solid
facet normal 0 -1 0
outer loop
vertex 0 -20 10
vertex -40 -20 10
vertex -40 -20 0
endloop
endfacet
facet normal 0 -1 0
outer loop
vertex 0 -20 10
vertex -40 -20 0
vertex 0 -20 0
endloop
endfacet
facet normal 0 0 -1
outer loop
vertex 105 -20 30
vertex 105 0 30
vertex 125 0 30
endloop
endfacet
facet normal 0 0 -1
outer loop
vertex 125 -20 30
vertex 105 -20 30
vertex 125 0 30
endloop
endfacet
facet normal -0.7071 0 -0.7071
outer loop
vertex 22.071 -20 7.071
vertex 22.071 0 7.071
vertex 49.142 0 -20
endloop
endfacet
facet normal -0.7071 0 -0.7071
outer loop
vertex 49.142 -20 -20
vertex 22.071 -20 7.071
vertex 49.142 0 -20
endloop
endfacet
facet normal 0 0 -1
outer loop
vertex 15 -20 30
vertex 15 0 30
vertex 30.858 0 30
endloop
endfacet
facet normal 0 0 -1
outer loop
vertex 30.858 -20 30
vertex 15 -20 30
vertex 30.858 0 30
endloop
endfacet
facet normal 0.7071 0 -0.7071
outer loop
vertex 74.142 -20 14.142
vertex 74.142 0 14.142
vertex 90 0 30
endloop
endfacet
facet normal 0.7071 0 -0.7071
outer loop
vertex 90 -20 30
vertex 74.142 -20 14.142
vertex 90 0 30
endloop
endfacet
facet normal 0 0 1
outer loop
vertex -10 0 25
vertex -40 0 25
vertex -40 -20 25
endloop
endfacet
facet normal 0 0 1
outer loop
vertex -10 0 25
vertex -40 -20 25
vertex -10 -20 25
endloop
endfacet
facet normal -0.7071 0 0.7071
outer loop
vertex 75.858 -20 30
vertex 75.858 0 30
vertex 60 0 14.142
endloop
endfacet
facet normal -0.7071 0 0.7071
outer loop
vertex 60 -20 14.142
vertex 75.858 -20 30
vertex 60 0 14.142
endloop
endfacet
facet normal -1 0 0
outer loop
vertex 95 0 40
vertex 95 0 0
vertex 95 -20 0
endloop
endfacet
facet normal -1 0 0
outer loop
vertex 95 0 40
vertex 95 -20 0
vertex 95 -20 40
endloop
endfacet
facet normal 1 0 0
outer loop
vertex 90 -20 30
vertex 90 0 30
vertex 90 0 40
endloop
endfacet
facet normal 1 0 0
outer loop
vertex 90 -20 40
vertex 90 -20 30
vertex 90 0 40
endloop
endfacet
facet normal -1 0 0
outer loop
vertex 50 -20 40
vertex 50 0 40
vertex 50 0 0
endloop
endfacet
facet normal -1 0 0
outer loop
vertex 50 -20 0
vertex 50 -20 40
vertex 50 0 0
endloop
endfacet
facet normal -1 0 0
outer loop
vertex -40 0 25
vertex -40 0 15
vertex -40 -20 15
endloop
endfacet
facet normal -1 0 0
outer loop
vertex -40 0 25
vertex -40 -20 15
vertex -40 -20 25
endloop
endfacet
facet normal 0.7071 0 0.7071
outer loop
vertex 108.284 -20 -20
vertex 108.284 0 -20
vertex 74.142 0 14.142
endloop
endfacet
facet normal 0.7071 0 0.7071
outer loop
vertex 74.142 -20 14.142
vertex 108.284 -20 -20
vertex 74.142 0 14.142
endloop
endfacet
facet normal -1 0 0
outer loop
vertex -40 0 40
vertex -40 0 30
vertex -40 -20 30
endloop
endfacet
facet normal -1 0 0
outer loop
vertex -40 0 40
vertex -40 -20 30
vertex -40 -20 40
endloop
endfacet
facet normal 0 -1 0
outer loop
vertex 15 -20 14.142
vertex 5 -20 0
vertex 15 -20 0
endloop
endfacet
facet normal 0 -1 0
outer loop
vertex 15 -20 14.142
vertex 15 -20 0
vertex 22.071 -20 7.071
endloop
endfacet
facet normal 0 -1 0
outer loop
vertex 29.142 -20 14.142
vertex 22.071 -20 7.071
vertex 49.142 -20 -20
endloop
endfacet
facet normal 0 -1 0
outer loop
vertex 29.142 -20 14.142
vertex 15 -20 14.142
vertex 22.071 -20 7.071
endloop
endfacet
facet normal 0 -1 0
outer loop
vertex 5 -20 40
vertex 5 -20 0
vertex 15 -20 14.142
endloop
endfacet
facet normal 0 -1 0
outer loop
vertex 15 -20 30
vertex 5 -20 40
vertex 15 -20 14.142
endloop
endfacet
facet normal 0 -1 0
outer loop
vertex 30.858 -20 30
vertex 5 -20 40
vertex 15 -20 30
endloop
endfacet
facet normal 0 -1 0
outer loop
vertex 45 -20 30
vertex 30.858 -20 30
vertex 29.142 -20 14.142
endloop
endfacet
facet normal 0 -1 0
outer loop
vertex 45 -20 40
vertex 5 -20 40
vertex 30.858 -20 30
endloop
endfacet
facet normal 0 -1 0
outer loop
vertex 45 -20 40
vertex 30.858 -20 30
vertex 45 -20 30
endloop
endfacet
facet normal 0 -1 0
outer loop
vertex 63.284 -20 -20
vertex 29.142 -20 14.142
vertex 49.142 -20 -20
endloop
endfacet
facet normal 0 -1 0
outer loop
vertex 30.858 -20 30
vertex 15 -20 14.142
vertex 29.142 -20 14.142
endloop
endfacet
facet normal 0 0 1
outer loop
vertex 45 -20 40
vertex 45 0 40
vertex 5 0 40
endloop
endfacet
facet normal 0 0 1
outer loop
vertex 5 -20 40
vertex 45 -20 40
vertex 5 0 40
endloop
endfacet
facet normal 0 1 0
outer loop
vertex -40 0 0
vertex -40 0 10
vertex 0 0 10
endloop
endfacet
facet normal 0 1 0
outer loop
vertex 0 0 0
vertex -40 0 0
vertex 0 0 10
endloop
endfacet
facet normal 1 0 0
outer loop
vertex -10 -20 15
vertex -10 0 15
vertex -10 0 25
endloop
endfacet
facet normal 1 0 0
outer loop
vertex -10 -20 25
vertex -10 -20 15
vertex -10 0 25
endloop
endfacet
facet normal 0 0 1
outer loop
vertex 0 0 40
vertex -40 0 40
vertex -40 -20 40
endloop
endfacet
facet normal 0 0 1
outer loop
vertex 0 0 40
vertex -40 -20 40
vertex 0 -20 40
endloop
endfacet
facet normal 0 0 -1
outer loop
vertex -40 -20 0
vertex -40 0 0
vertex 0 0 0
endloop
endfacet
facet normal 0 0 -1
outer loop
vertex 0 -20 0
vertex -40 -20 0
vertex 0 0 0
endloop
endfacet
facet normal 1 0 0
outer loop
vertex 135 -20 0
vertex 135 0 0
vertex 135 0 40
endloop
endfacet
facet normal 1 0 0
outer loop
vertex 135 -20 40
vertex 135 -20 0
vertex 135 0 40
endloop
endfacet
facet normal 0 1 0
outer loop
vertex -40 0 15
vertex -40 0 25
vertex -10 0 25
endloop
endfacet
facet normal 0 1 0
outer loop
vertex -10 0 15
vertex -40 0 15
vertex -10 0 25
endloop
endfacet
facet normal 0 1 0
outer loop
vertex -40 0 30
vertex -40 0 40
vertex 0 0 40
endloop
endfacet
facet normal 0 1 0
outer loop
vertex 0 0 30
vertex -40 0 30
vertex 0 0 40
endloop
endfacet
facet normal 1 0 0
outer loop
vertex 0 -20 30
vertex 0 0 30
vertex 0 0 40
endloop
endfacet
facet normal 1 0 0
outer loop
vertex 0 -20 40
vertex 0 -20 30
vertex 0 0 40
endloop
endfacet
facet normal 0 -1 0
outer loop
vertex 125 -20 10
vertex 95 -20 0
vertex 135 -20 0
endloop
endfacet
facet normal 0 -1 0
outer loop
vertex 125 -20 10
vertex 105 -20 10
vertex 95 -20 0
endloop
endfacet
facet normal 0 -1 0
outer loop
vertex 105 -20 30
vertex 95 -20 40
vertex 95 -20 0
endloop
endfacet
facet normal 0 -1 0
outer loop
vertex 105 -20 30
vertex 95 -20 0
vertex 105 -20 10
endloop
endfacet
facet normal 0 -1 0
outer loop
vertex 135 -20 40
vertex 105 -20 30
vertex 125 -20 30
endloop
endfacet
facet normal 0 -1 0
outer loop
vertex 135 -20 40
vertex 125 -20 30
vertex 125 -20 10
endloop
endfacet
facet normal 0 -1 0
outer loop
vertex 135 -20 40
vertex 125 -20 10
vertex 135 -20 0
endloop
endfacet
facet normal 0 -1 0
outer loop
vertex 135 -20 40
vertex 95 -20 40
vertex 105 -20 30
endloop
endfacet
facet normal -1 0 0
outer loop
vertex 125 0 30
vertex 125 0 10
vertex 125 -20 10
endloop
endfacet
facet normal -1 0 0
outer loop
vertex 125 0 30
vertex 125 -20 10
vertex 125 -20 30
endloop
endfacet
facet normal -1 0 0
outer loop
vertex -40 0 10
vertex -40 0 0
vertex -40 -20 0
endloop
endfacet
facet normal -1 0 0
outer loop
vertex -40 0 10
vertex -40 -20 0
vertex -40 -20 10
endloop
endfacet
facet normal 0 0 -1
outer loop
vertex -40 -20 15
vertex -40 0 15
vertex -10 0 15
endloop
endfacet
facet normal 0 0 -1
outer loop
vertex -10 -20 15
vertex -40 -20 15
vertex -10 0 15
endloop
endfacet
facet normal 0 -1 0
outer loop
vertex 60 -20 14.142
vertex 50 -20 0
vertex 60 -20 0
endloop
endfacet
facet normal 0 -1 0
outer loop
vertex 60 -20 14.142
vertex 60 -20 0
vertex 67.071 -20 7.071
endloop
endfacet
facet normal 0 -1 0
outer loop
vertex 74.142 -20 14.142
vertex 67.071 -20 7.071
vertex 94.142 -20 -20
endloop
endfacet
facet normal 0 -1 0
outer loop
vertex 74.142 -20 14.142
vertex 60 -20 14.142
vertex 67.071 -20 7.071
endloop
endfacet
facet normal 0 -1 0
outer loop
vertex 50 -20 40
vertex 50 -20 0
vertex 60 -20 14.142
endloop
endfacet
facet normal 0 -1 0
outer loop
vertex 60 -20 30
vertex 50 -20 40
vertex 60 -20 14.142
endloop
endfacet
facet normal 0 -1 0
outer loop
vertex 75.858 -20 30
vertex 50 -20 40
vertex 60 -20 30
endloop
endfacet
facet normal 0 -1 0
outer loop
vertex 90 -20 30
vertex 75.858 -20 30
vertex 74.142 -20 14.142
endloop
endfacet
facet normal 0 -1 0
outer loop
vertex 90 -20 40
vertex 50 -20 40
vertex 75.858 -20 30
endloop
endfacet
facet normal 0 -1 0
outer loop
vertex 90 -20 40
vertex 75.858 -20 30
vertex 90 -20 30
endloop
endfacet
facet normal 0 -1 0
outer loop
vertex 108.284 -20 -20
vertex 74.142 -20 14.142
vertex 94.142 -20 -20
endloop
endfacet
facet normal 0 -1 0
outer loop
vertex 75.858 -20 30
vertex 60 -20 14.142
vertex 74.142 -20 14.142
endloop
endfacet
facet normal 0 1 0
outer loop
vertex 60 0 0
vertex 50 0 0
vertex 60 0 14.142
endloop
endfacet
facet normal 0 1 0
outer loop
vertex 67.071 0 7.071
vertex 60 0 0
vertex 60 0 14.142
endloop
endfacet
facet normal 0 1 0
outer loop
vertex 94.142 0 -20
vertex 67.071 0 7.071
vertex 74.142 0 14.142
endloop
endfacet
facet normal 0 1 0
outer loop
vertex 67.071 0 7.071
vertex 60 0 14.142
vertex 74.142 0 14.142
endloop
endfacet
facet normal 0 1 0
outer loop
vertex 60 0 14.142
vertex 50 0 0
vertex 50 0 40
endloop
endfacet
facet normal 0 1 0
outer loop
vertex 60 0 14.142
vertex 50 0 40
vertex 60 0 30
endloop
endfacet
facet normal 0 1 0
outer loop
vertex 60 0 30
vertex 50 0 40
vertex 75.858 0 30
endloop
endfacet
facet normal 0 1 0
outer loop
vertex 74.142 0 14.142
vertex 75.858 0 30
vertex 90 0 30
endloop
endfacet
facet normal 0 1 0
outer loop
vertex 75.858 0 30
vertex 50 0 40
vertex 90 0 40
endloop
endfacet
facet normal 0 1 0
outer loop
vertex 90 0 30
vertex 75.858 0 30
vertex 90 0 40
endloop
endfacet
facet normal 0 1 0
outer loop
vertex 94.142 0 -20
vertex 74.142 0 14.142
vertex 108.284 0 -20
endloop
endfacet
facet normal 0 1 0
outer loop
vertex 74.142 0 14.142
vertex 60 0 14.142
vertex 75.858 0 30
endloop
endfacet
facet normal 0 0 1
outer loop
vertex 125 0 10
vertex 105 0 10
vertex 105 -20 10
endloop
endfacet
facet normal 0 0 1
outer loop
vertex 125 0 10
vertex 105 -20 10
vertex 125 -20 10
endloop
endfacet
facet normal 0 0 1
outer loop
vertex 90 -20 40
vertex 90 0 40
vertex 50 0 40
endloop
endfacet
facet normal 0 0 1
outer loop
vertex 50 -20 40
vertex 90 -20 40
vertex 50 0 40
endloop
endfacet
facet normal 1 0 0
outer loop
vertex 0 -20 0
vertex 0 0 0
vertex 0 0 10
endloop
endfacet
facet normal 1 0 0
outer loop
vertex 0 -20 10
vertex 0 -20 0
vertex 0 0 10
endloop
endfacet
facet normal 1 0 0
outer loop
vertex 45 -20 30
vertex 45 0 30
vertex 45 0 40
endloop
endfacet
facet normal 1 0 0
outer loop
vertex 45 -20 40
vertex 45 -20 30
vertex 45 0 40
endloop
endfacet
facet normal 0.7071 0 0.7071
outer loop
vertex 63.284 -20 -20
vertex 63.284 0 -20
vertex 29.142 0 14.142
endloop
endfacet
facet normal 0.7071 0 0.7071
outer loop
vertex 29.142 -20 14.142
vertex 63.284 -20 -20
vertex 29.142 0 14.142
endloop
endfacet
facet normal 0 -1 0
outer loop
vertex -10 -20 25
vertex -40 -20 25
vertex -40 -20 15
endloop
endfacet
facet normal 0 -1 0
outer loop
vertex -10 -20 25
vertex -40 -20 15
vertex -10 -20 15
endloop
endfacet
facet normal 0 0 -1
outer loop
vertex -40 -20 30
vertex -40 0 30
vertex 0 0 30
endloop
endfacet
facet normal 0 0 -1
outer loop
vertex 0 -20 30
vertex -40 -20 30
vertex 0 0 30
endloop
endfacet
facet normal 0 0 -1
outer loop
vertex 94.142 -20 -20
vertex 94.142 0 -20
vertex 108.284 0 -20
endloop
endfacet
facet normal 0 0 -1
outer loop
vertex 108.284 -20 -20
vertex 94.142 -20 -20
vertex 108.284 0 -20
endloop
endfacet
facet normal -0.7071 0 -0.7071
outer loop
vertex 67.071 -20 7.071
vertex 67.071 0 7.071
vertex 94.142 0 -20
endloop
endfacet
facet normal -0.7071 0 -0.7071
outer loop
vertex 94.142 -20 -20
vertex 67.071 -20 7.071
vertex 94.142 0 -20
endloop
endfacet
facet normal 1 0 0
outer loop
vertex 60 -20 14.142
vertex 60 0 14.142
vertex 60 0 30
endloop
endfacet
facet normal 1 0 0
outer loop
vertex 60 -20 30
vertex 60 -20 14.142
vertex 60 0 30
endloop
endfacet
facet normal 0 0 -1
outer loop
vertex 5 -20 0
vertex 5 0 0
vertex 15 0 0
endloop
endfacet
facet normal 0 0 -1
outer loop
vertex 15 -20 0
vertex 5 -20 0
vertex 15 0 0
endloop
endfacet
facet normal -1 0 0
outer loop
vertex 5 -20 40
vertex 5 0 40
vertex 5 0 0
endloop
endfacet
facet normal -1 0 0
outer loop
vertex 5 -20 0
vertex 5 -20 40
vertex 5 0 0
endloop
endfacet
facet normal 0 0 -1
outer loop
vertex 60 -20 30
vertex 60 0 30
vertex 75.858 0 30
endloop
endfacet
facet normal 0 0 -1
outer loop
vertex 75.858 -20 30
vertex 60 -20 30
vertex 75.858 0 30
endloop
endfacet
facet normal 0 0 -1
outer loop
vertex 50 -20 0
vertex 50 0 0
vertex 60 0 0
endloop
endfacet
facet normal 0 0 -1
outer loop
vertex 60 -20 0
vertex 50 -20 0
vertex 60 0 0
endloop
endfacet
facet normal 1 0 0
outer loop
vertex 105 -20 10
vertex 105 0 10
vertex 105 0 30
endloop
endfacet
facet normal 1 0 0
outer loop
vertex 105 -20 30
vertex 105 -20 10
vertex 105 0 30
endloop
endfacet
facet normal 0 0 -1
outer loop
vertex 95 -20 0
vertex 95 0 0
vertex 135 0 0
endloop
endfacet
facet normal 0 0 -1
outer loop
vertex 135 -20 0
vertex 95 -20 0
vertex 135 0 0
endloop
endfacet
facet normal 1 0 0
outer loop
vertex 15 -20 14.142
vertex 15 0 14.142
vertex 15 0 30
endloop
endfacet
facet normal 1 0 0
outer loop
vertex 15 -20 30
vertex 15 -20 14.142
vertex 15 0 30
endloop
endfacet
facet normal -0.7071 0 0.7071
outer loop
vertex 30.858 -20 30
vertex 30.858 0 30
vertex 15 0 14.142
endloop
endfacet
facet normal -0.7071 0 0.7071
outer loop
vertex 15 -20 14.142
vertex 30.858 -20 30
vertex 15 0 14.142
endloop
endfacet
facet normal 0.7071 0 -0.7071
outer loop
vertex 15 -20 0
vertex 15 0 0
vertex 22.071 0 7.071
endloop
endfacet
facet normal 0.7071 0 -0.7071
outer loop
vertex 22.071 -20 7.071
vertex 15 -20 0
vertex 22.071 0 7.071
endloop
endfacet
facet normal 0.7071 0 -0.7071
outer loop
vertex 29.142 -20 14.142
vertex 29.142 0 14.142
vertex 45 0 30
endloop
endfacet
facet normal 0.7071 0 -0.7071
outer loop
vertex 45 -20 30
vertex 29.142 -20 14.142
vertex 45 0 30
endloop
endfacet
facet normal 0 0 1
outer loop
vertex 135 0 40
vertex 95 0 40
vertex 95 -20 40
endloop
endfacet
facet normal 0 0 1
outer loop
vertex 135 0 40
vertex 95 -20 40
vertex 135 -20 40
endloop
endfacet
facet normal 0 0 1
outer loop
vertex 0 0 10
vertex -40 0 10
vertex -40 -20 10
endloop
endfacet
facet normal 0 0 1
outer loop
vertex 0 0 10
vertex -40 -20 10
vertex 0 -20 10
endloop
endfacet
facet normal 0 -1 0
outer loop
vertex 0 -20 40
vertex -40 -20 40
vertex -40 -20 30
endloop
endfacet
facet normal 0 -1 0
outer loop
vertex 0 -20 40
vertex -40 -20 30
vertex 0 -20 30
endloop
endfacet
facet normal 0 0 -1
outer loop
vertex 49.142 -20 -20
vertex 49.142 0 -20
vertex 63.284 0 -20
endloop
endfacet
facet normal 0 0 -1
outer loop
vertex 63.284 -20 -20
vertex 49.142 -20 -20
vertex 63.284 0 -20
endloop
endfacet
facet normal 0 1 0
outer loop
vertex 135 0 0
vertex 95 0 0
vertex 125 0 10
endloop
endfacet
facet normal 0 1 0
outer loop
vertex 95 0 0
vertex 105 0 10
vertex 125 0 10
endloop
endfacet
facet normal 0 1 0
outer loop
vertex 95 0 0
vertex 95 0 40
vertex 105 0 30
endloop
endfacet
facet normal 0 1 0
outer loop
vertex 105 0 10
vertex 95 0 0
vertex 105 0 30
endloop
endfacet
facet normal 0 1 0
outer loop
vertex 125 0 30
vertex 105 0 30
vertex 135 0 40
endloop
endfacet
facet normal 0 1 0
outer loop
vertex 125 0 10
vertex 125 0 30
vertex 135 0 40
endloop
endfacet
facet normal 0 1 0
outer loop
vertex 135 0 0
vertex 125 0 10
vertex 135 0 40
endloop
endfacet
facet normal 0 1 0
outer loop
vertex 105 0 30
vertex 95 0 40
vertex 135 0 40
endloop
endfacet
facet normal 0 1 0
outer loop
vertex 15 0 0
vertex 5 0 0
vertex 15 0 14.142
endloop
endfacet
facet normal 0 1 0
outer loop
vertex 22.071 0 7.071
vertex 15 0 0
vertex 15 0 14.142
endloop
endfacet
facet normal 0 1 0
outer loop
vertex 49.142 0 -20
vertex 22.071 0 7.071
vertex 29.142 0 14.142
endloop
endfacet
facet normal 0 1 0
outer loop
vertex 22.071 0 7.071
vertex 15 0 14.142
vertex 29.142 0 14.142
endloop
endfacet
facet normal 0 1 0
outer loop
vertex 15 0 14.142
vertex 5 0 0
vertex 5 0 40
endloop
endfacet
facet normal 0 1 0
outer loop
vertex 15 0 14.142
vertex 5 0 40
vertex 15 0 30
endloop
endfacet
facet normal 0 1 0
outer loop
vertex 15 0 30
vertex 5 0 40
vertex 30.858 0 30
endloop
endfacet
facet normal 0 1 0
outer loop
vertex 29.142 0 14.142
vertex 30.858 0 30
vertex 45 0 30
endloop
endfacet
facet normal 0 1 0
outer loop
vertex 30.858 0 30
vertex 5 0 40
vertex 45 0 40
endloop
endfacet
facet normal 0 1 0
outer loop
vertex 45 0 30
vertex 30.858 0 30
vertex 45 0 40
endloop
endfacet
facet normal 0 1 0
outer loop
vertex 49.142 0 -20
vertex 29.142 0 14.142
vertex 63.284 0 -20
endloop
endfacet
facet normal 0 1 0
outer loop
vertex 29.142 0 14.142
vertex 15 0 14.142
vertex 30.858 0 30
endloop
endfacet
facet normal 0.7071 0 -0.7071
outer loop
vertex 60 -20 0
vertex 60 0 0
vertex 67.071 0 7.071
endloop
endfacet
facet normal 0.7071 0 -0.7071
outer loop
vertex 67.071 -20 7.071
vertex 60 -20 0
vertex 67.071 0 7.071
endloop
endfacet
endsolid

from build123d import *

# Parameters (mm, degrees)
F0_W     = 40
F0_H     = 10
F0_W_2   = 30
F0_H_2   = 40
F0_W_3   = 20
F0_H_3   = 20
F1_DEPTH = 20


with BuildPart() as f1:
    # F0 (on Front) → F1 (new body)
    with BuildSketch(Plane.XZ):
        with Locations((-20, 35)):
            Rectangle(F0_W, F0_H)
        with Locations((-25, 20)):
            Rectangle(F0_W_2, F0_H)
        with Locations((-20, 5)):
            Rectangle(F0_W, F0_H)
        Polygon((5, 40), (5, 0), (15, 0), (22.071068, 7.071068), (49.142136, -20), (63.284271, -20), (29.142136, 14.142136), (45, 30), (45, 40), align=None)
        Polygon((15, 14.142136), (15, 30), (30.857864, 30), align=None, mode=Mode.SUBTRACT)
        Polygon((50, 40), (50, 0), (60, 0), (67.071068, 7.071068), (94.142136, -20), (108.284271, -20), (74.142136, 14.142136), (90, 30), (90, 40), align=None)
        Polygon((60, 14.142136), (60, 30), (75.857864, 30), align=None, mode=Mode.SUBTRACT)
        with Locations((115, 20)):
            Rectangle(F0_W, F0_H_2)
        with Locations((115, 20)):
            Rectangle(F0_W_3, F0_H_3, mode=Mode.SUBTRACT)
    extrude(amount=F1_DEPTH)


solid = f1.part
